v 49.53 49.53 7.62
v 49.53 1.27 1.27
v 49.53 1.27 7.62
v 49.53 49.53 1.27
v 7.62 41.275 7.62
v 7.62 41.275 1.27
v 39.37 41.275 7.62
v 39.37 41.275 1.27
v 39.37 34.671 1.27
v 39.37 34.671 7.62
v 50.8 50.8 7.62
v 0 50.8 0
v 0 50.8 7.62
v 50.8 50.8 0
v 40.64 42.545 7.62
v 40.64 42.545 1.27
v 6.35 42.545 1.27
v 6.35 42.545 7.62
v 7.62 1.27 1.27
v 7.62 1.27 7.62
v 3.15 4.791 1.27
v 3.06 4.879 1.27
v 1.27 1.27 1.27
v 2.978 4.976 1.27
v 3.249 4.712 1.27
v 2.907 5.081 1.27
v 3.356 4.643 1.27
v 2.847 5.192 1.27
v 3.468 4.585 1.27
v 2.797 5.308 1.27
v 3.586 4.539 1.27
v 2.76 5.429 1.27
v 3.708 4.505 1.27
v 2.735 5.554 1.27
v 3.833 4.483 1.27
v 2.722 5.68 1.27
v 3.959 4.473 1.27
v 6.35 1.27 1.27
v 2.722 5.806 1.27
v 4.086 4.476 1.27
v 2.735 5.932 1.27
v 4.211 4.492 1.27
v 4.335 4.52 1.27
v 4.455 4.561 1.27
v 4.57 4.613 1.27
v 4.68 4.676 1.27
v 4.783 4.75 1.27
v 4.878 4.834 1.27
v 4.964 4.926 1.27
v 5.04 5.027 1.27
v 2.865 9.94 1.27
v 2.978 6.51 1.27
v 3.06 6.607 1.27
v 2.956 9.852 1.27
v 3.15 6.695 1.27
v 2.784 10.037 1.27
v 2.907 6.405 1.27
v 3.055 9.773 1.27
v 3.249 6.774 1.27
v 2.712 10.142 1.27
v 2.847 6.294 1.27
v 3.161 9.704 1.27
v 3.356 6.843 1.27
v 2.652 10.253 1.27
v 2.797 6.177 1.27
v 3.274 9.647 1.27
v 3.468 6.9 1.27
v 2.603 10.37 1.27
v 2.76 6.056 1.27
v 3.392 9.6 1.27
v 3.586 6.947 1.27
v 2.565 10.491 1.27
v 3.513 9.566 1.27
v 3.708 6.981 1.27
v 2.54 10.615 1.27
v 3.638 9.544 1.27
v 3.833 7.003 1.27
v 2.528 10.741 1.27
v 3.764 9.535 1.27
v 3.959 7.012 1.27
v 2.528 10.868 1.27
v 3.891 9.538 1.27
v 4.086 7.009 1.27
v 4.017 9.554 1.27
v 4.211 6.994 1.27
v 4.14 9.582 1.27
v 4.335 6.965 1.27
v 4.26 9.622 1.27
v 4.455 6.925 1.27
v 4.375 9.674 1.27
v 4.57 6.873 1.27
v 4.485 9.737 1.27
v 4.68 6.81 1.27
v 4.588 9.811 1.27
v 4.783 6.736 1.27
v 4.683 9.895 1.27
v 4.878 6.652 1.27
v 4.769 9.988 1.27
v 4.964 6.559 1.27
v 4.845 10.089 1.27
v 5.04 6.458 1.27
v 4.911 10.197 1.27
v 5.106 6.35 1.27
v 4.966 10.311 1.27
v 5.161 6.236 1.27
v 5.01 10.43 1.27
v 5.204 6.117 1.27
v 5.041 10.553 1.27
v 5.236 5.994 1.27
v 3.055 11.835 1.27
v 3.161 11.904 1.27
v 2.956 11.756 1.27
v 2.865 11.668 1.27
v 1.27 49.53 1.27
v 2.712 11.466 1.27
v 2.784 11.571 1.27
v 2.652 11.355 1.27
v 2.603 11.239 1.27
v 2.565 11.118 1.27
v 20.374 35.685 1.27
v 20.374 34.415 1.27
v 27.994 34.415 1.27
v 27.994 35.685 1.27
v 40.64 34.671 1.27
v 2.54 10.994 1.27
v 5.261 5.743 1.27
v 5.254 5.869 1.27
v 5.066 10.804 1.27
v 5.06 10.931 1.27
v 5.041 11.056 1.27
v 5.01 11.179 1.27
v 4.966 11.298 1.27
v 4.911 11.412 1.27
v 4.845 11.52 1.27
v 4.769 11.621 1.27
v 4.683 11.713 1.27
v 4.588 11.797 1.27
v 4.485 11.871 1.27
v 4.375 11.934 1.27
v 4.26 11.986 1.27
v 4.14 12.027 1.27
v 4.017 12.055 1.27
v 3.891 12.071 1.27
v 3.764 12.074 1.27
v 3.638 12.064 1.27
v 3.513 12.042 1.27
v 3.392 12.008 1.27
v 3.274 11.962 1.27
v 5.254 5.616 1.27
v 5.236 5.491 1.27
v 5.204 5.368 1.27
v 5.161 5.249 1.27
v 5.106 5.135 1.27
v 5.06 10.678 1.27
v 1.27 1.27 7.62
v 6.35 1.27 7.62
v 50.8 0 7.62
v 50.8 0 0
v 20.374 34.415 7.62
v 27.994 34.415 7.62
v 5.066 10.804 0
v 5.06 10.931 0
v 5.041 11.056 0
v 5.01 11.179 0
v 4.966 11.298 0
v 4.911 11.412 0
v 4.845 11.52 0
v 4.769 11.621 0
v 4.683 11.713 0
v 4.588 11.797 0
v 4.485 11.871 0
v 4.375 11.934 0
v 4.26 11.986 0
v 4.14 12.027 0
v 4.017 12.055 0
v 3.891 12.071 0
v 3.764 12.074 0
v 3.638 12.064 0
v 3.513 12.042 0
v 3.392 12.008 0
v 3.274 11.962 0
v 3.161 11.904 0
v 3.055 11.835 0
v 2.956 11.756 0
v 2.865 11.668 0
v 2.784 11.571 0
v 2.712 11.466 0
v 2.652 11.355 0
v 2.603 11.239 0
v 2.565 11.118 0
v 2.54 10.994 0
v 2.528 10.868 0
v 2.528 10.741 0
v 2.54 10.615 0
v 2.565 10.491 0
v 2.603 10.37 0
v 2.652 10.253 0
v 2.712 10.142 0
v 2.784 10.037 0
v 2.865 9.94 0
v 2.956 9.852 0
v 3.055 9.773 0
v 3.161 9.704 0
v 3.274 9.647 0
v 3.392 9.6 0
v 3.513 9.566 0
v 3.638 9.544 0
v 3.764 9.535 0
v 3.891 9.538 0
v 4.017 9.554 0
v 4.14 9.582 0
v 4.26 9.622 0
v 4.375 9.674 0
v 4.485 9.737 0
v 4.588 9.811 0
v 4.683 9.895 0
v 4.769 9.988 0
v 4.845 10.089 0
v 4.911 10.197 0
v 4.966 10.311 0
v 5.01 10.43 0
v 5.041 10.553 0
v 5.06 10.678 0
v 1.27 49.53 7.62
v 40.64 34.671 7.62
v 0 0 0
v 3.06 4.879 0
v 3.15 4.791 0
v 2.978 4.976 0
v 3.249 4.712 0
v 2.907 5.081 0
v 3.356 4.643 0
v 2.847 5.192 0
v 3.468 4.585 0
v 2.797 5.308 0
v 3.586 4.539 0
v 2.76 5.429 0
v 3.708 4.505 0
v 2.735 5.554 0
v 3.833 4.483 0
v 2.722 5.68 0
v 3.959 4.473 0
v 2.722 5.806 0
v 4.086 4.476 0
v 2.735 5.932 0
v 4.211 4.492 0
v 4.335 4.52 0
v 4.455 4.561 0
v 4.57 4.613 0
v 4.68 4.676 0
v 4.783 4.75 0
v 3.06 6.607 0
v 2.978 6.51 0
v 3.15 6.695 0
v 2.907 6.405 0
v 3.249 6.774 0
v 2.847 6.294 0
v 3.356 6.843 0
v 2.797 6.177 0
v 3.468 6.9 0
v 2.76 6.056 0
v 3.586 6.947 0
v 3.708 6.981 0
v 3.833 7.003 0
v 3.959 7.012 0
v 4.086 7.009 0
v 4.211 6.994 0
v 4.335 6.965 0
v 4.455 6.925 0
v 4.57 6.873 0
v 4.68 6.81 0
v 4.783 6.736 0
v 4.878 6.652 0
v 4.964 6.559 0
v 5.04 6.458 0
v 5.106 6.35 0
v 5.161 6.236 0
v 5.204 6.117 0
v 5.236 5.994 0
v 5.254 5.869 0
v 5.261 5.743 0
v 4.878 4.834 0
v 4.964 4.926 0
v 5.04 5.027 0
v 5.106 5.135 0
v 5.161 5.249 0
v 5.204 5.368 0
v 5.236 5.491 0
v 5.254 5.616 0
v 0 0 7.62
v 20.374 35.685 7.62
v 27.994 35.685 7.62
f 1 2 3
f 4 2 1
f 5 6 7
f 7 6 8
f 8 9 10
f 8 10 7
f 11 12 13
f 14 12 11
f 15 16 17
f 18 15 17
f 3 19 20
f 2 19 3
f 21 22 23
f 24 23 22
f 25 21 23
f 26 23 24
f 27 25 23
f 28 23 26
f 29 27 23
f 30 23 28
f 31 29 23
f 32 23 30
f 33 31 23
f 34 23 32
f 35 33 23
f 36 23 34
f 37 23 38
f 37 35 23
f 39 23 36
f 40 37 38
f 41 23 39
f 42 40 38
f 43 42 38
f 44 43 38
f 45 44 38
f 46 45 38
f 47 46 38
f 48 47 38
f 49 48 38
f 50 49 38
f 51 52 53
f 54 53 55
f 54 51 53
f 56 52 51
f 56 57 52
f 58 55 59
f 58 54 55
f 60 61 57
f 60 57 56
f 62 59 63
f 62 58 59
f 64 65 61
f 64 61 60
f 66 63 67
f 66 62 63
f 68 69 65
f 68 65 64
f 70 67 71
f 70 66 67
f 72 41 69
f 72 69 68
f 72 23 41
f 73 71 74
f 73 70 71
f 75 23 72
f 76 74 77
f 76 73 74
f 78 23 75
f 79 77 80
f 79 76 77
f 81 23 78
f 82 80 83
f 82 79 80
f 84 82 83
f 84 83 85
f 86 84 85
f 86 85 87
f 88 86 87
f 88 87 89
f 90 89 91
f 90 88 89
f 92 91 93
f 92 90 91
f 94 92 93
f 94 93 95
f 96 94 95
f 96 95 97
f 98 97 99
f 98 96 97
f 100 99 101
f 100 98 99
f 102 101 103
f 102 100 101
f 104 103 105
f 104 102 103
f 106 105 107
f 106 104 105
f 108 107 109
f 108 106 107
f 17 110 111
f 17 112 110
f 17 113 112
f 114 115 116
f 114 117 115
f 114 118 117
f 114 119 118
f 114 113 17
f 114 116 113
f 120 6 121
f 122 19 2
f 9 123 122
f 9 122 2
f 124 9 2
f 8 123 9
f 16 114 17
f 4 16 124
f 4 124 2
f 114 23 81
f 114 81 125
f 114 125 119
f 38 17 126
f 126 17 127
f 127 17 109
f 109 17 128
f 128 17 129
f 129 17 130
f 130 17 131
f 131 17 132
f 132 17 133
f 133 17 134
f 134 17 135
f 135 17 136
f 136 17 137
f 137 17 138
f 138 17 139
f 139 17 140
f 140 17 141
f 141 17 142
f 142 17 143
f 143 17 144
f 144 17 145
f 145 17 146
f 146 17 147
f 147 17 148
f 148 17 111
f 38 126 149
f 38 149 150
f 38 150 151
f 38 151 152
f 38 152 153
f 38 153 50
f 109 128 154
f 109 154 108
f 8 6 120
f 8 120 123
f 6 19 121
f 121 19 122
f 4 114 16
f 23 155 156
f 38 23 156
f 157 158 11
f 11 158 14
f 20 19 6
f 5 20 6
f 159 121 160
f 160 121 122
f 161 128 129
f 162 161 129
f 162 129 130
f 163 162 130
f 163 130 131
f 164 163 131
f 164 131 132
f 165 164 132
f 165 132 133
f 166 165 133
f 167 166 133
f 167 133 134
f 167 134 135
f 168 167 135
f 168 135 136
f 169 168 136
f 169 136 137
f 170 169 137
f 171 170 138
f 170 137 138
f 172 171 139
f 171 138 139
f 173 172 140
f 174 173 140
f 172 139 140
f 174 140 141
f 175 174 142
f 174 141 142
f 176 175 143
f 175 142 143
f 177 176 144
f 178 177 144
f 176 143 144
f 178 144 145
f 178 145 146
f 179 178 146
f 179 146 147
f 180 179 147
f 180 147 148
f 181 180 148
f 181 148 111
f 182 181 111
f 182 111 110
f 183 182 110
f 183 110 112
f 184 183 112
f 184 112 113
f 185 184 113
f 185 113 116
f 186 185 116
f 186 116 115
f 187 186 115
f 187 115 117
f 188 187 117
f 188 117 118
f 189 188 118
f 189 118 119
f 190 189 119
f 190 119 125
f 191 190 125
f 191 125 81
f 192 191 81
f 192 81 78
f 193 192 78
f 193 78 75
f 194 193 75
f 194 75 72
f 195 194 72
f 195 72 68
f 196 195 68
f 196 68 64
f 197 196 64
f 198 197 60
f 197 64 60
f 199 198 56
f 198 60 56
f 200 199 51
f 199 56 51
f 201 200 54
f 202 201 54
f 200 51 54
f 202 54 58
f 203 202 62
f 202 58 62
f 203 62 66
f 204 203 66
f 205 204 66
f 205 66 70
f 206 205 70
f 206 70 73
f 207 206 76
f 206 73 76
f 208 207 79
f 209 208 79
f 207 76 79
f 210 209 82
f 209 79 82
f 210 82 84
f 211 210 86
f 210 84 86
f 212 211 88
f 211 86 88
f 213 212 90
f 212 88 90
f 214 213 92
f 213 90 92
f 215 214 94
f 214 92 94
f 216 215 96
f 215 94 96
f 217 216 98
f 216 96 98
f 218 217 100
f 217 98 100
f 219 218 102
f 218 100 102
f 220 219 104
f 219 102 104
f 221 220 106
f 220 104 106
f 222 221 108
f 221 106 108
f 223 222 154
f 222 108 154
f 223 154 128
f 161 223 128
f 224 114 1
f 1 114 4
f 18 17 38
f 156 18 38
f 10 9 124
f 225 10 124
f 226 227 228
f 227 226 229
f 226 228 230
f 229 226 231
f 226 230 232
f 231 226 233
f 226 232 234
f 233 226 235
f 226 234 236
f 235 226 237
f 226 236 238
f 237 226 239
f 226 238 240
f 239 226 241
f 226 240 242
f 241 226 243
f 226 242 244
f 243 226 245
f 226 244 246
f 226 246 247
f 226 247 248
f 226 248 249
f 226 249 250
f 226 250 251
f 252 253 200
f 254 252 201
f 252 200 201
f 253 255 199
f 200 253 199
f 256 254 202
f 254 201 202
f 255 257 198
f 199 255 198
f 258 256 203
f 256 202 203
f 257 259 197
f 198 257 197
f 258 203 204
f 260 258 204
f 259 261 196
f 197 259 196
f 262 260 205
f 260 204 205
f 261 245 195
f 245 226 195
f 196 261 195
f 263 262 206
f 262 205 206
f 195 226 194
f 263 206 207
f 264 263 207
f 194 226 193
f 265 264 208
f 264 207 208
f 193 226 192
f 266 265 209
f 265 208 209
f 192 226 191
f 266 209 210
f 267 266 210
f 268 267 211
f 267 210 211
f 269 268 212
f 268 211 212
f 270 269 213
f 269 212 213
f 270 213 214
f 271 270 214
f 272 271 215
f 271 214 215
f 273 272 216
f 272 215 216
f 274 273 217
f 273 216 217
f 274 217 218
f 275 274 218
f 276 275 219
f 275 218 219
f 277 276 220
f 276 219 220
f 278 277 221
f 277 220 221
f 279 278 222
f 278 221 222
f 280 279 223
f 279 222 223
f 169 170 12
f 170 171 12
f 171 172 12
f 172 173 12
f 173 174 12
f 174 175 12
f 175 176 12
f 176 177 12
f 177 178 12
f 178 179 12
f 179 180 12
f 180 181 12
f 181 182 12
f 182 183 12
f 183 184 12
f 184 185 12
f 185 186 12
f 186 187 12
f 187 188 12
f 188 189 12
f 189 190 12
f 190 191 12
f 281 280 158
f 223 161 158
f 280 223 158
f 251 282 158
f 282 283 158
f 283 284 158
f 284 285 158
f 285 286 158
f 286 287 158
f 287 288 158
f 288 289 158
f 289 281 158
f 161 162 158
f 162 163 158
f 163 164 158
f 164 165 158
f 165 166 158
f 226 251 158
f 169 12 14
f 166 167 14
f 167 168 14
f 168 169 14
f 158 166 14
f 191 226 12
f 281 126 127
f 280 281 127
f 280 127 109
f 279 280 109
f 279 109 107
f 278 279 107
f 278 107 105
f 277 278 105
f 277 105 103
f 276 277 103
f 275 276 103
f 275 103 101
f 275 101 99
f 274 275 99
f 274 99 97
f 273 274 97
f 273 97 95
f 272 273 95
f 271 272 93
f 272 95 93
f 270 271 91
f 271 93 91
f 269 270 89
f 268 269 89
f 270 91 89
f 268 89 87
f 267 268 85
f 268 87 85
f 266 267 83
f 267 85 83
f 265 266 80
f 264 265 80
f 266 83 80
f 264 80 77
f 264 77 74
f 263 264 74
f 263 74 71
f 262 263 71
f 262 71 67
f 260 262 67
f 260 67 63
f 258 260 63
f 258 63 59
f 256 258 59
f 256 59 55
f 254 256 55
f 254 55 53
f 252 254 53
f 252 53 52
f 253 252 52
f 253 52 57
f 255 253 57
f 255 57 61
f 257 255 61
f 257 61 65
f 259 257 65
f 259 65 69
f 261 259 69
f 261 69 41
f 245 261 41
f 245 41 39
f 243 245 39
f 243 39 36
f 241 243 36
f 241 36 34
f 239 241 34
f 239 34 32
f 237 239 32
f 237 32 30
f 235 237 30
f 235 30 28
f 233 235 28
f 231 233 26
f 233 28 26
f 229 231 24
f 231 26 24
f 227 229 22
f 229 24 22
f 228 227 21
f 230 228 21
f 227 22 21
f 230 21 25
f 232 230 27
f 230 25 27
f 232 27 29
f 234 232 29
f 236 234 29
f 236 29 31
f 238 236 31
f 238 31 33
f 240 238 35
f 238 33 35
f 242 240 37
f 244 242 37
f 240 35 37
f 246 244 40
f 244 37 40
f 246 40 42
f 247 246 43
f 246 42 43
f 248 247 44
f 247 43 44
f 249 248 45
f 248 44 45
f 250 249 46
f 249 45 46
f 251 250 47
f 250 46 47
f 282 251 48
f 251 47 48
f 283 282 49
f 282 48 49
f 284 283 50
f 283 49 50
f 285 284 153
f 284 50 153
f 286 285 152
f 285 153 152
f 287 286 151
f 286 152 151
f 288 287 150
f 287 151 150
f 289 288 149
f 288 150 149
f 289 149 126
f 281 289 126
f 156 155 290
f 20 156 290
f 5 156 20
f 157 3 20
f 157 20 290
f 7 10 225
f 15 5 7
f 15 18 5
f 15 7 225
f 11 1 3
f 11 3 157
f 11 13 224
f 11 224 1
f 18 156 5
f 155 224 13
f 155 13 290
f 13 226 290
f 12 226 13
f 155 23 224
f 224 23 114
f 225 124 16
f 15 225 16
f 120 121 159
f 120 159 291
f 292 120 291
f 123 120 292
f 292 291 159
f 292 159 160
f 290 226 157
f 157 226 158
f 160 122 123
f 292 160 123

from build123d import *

# Parameters (mm, degrees)
F0_W     = 50.8
F0_H     = 50.8
F1_DEPTH = 7.62
F2_T     = -1.27
F3_W     = 1.27
F3_H     = 6.604
F3_W_2   = 7.62
F3_H_2   = 1.27
F4_DEPTH = 6.35
F5_R     = 1.27
F6_DEPTH = 25.4


with BuildPart() as f1:
    # F0 (on Top) → F1 (new body)
    with BuildSketch(Plane.XY):
        with Locations((25.4, 25.4)):
            Rectangle(F0_W, F0_H)
    extrude(amount=F1_DEPTH)

    # F2
    f2_openings = [f1.faces().sort_by_distance(p)[0] for p in [
        (25.4, 25.4, 7.62),
    ]]
    offset(amount=F2_T, openings=f2_openings)

    # F3 (on face) → F4 (join)
    with BuildSketch(Plane.XY.offset(1.27)):
        Polygon((6.35, 42.545278), (6.35, 1.27), (7.62, 1.27), (7.62, 41.275278), (7.62, 42.545278), align=None)
        Polygon((7.62, 42.545278), (7.62, 41.275278), (39.37, 41.275278), (40.64, 41.275278), (40.64, 42.545278), align=None)
        with Locations((40.005, 37.973278)):
            Rectangle(F3_W, F3_H)
        with Locations((24.184101, 35.050092)):
            Rectangle(F3_W_2, F3_H_2)
    extrude(amount=F4_DEPTH)

    # F5 (on face) → F6 (cut)
    with BuildSketch(Plane.XY.offset(1.27)):
        with Locations((3.990767, 5.742811)):
            Circle(F5_R)
        with Locations((3.796095, 10.80427)):
            Circle(F5_R)
    extrude(amount=-F6_DEPTH, mode=Mode.SUBTRACT)


solid = f1.part
